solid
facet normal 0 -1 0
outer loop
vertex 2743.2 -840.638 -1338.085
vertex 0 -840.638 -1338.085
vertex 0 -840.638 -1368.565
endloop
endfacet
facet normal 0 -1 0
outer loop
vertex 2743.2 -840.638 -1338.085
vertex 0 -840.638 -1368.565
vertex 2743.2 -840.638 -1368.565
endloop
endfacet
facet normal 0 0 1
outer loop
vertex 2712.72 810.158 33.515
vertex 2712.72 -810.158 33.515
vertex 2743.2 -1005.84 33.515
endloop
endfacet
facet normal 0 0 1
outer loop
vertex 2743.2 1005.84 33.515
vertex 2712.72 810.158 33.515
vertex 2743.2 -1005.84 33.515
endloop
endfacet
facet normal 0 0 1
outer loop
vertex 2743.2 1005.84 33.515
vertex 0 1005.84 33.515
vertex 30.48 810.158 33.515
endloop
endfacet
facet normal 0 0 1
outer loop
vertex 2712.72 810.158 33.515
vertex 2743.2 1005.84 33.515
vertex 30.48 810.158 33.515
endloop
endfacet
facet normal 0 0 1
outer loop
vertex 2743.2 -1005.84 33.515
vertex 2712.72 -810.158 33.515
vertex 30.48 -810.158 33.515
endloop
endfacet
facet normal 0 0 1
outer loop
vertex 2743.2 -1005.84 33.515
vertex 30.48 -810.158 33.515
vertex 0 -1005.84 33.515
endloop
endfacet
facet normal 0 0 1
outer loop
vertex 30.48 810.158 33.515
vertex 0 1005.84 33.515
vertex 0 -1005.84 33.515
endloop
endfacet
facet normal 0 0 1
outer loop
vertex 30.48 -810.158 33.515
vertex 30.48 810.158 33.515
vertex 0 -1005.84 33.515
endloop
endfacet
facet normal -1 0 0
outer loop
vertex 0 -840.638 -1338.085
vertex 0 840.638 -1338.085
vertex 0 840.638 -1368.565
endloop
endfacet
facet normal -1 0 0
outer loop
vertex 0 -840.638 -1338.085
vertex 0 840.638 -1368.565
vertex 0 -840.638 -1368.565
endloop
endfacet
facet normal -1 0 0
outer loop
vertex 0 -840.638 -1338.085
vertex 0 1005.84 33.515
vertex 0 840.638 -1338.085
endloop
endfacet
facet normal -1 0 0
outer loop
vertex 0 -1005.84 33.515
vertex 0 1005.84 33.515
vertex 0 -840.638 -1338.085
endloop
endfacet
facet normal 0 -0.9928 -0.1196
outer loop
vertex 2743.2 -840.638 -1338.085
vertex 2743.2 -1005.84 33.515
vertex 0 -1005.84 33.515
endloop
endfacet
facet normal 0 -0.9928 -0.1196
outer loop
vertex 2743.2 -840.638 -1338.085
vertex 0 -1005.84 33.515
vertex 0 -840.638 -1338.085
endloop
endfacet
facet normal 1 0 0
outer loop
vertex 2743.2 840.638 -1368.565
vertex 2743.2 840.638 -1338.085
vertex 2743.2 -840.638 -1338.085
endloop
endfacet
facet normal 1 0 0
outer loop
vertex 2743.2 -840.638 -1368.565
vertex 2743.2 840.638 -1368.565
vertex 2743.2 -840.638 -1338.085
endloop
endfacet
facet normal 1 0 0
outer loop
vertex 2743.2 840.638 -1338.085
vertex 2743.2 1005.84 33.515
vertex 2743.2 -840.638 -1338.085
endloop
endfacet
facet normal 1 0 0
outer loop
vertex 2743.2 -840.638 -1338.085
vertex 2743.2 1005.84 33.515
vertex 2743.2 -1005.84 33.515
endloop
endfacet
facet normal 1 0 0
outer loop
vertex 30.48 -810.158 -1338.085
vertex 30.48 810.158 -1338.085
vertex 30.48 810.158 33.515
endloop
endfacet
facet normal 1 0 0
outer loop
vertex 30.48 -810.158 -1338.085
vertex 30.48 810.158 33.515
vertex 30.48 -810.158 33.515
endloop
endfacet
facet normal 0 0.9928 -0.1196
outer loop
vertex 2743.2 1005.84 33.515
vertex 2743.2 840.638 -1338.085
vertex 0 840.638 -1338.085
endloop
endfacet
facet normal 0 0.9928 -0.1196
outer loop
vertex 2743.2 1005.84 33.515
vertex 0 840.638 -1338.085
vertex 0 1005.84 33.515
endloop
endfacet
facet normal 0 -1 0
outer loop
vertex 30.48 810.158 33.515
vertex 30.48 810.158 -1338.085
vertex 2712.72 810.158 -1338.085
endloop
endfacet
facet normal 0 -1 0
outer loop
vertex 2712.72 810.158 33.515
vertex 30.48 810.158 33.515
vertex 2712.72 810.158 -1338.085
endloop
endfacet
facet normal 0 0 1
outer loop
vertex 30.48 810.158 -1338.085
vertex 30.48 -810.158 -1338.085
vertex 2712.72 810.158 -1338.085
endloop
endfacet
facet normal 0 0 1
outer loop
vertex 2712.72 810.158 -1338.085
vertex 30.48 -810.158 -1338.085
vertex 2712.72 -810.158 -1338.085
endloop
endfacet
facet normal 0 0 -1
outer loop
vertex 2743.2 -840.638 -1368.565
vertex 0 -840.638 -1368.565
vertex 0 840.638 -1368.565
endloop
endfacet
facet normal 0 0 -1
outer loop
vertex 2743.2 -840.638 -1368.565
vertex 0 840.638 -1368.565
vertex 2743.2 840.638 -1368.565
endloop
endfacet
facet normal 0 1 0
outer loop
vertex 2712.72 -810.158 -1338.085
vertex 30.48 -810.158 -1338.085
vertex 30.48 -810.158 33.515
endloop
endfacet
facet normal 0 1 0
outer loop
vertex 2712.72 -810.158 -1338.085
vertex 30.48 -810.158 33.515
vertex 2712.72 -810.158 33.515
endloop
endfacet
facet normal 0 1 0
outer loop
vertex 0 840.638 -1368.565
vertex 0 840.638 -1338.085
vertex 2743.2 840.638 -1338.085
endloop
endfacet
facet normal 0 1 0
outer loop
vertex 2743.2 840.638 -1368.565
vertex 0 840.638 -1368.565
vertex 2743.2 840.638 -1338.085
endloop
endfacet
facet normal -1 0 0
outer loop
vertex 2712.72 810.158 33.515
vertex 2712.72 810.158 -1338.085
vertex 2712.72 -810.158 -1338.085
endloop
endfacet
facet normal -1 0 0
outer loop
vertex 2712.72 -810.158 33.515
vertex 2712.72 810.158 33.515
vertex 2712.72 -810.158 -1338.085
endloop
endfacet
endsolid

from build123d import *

# Parameters (mm, degrees)
F1_DEPTH = 2743.2
F2_W     = 2682.24
F2_H     = 1620.3168
F3_DEPTH = 1371.6
F4_W     = 2743.2
F4_H     = 1681.2768
F5_DEPTH = 30.48


with BuildPart() as f1:
    # F0 (on Right) → F1 (new body)
    with BuildSketch(Plane.YZ):
        Polygon((-840.6384, -1338.085146), (0, -1338.085146), (840.6384, -1338.085146), (1005.84, 33.514854), (0, 33.514854), (-1005.84, 33.514854), align=None)
    extrude(amount=F1_DEPTH)

    # F2 (on face) → F3 (cut, through all)
    with BuildSketch(Plane(origin=(0, 0, -1338.085146), x_dir=(1, 0, 0), z_dir=(0, 0, -1))):
        with Locations((1371.6, 0)):
            Rectangle(F2_W, F2_H)
    extrude(amount=-F3_DEPTH, mode=Mode.SUBTRACT)

    # F4 (on face) → F5 (join)
    with BuildSketch(Plane(origin=(0, 0, -1338.085146), x_dir=(1, 0, 0), z_dir=(0, 0, -1))):
        with Locations((1371.6, 0)):
            Rectangle(F4_W, F4_H)
    extrude(amount=F5_DEPTH)


solid = f1.part
